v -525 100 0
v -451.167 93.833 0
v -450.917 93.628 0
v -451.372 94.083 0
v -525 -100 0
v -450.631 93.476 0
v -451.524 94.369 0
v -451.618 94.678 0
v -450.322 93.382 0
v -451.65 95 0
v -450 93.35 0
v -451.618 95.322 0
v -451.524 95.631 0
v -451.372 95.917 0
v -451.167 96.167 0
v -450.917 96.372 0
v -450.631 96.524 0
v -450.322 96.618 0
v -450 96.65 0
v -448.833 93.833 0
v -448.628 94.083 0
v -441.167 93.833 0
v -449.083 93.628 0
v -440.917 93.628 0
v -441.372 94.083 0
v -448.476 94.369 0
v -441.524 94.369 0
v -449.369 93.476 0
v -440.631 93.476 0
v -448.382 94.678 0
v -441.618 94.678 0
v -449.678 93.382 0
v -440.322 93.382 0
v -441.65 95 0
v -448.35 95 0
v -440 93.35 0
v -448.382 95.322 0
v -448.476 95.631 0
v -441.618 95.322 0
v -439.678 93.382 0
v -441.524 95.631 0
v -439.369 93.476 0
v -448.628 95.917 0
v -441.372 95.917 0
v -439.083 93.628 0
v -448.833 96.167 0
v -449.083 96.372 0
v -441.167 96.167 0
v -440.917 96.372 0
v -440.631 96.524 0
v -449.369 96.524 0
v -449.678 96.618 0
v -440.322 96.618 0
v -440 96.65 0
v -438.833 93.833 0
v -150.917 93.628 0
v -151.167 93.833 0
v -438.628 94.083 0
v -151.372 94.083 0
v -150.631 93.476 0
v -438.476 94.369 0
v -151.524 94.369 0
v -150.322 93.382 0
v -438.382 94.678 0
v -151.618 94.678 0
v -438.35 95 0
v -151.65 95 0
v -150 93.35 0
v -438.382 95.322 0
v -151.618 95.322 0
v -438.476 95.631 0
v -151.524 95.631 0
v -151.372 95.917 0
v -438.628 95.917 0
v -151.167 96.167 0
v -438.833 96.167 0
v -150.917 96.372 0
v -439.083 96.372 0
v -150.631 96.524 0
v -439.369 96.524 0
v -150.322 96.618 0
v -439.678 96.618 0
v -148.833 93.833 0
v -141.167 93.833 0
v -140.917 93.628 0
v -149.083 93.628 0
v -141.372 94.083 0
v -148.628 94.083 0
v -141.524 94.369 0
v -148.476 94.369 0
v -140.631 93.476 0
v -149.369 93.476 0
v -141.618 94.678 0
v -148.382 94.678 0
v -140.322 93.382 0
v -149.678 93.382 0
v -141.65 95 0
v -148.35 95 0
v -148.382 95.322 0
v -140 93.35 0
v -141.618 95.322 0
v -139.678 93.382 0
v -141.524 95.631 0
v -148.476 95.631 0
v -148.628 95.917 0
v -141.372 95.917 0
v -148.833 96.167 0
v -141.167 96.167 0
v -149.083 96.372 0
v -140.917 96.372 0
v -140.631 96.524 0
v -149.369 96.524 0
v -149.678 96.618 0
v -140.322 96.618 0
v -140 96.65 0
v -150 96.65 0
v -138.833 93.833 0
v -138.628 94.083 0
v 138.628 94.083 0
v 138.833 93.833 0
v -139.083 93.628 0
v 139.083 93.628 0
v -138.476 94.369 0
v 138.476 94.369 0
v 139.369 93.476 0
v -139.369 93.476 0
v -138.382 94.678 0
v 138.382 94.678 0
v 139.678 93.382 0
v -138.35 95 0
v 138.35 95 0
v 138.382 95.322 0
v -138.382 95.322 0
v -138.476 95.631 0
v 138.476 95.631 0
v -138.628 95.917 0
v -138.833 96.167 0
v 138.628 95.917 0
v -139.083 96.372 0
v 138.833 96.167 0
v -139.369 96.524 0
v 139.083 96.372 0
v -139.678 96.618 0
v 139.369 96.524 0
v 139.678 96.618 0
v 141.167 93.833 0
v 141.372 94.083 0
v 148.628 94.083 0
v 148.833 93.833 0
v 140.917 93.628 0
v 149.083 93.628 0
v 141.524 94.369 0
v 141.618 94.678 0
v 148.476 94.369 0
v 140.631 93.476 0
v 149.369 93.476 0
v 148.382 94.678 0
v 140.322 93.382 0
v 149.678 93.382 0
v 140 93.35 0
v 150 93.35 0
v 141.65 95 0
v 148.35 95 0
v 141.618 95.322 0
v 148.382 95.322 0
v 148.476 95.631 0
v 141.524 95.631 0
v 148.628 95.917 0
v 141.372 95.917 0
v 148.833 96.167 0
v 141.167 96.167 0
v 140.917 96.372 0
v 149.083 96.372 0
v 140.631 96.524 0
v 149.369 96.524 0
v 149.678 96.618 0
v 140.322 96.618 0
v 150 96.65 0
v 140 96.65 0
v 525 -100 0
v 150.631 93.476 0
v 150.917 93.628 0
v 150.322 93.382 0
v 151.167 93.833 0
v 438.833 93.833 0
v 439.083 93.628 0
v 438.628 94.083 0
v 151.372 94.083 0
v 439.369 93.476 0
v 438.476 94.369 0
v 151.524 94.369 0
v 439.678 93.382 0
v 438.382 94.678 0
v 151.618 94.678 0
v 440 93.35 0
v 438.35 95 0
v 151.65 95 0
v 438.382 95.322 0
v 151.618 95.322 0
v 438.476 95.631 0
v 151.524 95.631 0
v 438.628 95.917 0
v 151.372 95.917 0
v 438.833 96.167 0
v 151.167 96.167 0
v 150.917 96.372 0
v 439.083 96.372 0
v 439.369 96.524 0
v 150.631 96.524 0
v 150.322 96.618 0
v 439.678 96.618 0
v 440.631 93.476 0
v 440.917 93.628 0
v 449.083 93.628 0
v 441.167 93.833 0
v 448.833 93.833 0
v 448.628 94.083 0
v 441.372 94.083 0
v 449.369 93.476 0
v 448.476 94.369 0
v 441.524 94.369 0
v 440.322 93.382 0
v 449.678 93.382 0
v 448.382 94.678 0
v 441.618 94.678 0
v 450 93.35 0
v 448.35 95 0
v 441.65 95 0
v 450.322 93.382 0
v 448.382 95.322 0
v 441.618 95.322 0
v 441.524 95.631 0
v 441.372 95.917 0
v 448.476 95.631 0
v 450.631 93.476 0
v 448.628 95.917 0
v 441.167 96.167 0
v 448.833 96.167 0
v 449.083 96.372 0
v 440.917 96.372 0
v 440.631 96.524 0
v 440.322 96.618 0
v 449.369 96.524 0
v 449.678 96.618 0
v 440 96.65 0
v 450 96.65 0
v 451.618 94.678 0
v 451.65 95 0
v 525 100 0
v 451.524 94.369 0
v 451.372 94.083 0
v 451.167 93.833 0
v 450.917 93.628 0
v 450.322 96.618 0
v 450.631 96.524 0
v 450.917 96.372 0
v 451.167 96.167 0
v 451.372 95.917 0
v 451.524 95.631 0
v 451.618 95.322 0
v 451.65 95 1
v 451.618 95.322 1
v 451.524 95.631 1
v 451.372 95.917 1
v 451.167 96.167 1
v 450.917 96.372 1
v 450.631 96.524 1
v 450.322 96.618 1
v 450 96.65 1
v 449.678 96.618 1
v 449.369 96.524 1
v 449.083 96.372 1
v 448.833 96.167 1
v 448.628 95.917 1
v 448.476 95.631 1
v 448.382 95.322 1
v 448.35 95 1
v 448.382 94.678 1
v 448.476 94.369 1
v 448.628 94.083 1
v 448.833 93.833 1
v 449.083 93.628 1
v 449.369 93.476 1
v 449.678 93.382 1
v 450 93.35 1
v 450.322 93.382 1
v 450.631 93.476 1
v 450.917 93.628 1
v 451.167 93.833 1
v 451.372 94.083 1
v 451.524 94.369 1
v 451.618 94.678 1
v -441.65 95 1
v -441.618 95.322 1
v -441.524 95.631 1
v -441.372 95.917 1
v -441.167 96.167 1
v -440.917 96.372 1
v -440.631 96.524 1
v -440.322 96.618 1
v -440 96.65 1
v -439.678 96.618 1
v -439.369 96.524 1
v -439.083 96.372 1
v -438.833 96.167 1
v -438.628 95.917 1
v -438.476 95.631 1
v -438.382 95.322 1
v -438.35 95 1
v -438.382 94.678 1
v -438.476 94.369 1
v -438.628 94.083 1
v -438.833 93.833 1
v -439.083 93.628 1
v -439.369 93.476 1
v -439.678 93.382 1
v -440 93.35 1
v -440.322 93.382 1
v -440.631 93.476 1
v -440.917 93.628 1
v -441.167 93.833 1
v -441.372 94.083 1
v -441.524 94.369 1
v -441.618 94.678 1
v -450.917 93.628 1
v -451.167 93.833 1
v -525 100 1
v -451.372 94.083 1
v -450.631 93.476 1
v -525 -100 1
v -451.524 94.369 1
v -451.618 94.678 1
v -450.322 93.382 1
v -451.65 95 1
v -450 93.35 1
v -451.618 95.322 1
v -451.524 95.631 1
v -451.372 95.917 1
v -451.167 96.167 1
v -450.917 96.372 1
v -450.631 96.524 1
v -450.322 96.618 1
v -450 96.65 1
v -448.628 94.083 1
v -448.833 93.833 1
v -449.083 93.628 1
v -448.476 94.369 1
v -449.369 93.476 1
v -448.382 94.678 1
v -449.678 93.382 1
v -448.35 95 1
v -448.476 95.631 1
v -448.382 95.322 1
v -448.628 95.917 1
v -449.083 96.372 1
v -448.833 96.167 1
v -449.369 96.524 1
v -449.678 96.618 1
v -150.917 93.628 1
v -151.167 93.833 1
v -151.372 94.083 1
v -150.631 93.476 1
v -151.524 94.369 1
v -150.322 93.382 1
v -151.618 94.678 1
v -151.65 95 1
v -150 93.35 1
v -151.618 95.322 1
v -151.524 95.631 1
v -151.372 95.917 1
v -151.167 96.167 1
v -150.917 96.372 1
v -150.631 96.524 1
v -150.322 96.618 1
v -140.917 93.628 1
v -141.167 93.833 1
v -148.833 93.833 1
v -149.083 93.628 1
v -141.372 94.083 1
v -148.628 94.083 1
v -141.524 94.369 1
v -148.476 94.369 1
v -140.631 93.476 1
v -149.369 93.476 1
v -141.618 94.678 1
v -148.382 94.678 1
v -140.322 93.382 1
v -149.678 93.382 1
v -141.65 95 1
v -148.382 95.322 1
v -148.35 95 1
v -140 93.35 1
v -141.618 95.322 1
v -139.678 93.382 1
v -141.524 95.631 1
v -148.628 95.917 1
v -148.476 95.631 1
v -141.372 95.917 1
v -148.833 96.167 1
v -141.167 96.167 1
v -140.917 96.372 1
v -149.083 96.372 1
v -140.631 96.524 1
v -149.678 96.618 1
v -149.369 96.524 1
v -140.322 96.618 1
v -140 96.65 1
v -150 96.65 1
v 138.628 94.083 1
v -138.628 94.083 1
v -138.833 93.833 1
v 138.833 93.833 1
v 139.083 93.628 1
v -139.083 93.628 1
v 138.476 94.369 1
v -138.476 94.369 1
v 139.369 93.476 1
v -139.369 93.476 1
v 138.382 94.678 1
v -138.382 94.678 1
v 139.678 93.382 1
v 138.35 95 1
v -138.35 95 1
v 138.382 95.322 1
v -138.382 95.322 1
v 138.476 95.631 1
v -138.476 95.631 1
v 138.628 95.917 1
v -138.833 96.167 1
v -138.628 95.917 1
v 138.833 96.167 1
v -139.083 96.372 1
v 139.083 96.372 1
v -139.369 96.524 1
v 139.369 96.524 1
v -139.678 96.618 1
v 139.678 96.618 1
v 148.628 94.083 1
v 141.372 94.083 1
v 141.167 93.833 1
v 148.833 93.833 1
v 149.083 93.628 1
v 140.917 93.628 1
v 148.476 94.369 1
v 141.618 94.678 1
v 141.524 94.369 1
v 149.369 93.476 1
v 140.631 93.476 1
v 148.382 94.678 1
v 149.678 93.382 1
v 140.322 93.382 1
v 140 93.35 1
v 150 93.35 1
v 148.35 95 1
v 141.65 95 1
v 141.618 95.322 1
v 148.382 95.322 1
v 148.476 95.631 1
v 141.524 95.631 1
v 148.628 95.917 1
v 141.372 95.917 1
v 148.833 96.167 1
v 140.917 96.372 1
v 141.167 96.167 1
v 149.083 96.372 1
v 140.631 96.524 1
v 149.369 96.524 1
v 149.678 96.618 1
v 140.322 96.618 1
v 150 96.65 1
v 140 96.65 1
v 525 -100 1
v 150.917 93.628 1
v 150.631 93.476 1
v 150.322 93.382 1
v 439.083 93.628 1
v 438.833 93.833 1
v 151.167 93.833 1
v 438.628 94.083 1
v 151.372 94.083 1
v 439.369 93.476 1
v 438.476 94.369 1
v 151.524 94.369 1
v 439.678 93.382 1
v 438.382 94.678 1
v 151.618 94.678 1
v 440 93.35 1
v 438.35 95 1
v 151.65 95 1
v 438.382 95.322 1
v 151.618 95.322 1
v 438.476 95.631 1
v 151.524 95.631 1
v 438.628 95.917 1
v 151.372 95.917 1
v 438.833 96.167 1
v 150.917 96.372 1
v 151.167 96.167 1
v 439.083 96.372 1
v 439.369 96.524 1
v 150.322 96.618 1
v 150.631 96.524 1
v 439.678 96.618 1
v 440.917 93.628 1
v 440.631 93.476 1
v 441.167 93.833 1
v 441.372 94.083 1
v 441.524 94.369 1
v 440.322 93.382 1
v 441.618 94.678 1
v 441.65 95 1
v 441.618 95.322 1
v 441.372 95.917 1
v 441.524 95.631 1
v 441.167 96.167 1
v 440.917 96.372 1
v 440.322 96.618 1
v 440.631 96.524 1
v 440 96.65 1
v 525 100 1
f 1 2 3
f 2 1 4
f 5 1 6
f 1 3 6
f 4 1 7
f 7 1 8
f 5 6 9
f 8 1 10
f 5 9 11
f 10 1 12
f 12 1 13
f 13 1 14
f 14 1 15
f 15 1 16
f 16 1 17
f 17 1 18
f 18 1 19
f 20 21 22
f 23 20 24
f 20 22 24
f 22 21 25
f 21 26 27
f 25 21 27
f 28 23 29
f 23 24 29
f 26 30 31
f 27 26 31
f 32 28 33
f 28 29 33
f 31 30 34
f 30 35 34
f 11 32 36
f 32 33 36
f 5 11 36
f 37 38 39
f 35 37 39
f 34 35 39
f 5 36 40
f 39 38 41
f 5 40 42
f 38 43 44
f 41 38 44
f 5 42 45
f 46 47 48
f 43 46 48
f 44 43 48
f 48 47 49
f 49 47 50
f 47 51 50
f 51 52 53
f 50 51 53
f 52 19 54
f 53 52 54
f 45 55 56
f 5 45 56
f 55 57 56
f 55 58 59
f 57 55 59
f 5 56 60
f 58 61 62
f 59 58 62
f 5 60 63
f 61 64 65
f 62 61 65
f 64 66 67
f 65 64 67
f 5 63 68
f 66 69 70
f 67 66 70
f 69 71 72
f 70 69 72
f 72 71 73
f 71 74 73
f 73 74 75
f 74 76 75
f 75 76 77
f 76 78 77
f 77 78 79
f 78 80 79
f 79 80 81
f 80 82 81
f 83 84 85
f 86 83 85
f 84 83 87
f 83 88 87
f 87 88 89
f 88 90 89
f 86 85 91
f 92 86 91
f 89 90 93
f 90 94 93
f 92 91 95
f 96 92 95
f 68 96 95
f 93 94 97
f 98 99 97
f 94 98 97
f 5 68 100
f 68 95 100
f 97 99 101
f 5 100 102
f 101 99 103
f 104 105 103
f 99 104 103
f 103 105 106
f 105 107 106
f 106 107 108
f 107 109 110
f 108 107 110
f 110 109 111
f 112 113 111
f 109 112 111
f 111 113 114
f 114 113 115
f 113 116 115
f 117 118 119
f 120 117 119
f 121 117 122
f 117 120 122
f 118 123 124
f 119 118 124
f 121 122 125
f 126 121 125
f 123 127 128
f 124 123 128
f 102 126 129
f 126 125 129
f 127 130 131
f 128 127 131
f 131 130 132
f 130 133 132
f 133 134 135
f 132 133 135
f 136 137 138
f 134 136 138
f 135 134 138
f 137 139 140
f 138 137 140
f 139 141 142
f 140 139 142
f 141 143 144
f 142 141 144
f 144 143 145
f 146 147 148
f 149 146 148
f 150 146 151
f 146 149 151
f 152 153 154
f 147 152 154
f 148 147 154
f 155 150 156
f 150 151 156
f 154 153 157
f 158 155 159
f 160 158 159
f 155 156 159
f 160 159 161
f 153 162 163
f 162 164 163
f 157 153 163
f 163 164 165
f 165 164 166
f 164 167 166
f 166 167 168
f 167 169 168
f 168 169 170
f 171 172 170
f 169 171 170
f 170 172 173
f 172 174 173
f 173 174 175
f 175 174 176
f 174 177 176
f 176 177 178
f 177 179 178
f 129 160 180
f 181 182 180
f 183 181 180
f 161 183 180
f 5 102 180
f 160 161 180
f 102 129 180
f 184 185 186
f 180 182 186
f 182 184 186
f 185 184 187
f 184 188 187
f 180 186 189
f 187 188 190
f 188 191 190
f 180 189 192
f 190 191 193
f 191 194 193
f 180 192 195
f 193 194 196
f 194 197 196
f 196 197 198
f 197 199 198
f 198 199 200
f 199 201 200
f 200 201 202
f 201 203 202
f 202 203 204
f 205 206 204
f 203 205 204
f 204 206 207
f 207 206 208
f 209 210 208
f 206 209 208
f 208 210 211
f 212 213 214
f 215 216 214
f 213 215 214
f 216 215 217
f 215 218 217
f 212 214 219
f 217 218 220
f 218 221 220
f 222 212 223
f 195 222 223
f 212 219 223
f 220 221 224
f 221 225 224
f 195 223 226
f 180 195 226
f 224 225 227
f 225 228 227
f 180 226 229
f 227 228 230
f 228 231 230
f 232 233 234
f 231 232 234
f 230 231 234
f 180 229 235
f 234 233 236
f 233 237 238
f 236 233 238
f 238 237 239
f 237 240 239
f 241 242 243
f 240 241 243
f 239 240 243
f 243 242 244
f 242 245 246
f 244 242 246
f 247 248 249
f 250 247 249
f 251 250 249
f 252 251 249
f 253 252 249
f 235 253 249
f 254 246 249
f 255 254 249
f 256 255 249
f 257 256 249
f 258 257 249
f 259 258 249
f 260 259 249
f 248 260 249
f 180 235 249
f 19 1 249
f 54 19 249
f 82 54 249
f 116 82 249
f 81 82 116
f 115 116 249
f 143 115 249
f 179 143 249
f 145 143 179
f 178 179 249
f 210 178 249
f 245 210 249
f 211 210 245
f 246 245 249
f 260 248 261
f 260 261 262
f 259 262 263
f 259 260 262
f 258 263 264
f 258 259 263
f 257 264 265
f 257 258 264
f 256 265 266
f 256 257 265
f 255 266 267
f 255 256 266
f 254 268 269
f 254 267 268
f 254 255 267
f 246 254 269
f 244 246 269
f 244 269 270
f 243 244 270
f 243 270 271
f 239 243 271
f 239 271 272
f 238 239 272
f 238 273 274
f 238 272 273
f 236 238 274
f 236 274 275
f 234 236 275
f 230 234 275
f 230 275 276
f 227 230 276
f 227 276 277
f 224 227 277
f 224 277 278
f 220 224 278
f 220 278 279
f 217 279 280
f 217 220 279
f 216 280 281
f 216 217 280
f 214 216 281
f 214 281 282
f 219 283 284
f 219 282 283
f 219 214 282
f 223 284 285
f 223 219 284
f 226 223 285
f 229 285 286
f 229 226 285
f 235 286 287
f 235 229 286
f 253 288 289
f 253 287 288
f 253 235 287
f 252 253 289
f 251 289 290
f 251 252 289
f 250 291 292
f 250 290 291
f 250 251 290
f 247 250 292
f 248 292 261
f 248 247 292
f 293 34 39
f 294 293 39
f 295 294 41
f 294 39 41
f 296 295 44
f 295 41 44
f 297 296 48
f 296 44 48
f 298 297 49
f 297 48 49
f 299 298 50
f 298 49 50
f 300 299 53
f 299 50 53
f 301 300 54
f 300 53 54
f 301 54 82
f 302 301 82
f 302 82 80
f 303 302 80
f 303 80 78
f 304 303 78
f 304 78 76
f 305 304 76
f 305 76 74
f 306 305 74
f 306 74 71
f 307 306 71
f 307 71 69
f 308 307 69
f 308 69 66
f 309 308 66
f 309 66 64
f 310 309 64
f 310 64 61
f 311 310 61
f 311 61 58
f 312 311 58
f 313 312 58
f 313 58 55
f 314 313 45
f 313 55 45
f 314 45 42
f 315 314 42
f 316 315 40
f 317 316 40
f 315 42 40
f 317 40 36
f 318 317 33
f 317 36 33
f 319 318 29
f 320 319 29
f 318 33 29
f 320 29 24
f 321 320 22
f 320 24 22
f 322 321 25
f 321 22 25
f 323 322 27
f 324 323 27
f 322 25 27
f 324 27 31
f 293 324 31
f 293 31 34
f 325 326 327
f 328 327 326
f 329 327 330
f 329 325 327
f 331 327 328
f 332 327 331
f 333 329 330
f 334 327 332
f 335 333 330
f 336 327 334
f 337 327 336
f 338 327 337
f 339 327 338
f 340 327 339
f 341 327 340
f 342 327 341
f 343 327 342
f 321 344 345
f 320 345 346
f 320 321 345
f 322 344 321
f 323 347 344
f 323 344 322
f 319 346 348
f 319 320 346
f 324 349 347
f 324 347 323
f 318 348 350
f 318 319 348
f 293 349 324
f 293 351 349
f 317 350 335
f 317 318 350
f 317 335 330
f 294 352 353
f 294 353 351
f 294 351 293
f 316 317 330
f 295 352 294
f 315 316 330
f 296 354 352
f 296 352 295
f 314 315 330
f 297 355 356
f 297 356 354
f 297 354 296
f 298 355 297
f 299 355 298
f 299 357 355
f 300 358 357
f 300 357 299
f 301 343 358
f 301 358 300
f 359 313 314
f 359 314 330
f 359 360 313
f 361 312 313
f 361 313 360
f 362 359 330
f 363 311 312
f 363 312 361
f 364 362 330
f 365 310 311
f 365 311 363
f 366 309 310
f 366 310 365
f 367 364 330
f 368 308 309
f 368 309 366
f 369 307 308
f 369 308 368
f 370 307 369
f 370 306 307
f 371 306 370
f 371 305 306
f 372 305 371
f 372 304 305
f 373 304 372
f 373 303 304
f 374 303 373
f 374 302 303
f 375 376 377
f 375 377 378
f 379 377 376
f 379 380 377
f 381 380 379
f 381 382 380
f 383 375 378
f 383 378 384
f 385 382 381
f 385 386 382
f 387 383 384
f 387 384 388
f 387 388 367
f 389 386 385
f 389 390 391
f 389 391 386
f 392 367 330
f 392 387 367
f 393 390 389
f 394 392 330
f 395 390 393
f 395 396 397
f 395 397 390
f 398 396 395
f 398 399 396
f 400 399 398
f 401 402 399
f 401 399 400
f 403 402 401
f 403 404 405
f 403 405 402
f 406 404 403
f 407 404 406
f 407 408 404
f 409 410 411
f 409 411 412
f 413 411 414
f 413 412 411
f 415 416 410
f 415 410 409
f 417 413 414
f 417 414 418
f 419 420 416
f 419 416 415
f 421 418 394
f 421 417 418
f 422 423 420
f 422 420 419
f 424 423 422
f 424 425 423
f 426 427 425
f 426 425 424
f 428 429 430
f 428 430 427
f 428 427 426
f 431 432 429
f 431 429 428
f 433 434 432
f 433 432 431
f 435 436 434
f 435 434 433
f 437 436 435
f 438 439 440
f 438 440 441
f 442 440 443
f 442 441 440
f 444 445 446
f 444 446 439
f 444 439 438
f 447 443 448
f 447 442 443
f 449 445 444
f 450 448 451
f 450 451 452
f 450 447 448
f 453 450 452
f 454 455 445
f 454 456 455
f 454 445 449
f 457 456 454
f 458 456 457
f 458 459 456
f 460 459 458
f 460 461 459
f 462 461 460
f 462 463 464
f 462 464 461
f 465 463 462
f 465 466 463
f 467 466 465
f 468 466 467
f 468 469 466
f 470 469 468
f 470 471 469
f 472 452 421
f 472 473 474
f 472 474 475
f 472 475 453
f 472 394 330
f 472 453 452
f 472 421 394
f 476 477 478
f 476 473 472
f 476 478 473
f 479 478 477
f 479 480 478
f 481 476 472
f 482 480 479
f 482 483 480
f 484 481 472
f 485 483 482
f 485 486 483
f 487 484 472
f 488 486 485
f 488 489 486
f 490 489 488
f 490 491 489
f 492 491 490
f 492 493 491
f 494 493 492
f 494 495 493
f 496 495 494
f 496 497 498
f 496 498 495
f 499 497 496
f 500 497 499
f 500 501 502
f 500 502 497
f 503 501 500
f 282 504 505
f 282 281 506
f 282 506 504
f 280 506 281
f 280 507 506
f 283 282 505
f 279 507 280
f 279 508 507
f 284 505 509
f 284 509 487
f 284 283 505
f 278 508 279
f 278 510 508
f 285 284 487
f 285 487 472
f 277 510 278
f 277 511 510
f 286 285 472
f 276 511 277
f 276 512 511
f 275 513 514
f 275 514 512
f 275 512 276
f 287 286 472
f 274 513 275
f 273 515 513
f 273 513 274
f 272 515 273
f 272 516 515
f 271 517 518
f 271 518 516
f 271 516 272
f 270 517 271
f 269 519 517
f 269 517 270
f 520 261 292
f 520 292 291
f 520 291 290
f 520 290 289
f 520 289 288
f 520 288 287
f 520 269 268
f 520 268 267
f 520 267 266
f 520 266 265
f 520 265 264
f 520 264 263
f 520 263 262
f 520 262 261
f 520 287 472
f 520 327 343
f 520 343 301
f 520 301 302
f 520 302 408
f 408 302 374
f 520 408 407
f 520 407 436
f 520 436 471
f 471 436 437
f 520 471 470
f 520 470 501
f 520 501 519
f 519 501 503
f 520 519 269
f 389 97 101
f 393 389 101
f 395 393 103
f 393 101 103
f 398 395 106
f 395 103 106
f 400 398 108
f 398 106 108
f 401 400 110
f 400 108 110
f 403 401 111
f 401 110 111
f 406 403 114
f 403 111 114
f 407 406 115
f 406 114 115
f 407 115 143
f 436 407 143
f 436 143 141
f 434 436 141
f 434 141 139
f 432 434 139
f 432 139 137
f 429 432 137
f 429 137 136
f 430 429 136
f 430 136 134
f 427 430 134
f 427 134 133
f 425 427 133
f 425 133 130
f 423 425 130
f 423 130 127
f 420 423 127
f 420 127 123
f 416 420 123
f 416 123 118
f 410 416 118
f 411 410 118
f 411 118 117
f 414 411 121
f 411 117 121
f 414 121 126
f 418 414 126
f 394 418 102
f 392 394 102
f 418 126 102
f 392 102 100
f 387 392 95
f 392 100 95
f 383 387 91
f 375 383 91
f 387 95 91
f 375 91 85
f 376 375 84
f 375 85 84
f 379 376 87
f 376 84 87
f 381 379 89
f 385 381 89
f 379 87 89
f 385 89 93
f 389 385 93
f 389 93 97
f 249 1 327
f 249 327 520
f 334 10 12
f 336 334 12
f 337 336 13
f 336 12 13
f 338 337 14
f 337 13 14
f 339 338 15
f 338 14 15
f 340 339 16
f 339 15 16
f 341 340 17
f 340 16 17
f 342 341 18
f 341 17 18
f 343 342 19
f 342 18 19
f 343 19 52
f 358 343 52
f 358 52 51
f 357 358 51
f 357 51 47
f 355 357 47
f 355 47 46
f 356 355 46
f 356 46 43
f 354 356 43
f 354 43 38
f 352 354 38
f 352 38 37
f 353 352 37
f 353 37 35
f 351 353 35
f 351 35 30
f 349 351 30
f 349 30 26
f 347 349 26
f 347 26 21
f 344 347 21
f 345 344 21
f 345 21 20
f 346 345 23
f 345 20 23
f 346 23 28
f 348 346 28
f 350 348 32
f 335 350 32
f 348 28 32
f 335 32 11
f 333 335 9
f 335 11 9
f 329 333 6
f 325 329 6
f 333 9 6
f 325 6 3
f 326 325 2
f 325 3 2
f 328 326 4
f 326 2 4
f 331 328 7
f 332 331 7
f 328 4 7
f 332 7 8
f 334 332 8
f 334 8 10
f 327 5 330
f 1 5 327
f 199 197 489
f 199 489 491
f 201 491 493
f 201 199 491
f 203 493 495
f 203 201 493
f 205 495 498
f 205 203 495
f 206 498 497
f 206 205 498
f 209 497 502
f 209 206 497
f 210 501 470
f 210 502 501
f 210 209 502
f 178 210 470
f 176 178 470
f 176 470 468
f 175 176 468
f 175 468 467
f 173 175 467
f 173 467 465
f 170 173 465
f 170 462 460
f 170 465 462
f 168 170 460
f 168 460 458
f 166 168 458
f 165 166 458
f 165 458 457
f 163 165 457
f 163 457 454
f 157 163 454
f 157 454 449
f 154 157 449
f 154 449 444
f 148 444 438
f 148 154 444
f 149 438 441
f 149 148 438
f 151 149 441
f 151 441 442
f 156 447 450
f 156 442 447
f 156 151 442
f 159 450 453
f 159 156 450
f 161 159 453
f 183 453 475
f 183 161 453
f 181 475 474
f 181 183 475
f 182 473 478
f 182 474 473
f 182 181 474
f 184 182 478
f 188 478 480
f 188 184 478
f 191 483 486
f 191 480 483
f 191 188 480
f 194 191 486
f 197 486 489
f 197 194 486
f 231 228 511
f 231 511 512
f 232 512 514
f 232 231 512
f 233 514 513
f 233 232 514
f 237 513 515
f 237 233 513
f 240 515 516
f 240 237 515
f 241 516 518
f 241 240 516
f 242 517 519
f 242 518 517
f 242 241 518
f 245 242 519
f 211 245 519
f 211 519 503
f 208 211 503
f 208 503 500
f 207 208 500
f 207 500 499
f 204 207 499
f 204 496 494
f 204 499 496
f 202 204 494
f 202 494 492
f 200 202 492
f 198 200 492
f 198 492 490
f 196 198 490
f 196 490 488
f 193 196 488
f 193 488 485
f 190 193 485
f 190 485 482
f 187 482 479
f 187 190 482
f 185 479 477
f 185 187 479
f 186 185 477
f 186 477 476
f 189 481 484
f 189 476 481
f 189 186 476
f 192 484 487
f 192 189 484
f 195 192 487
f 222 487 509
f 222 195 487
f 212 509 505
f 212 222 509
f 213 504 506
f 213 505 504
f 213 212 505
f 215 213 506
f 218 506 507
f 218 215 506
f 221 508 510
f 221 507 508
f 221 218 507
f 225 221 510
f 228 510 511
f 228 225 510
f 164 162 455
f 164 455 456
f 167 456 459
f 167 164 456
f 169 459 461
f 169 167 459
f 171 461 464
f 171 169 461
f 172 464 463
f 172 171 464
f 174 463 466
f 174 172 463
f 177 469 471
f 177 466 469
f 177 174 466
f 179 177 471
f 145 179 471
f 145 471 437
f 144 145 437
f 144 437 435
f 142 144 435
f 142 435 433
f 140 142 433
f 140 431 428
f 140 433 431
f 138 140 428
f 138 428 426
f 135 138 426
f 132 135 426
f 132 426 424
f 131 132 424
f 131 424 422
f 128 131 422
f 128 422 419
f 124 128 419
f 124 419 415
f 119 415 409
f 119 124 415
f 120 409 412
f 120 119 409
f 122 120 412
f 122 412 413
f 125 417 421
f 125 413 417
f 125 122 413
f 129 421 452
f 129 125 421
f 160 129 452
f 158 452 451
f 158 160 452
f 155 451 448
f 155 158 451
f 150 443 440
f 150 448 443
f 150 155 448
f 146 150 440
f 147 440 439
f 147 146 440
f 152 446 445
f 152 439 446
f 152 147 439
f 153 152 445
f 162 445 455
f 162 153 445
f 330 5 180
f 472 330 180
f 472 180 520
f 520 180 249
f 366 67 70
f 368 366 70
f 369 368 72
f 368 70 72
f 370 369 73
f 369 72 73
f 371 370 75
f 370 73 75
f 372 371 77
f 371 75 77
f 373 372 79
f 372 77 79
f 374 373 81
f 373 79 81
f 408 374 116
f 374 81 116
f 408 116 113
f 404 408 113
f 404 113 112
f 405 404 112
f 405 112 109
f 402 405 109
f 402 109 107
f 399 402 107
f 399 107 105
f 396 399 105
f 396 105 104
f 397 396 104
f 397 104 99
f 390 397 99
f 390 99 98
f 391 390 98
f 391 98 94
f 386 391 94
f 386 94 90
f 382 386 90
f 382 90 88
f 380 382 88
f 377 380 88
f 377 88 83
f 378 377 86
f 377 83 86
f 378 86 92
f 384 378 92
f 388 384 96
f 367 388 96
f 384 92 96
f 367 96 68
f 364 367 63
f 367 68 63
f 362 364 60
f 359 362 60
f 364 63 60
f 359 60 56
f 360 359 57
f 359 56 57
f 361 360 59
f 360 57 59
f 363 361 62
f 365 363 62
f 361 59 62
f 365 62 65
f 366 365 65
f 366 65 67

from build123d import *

# Parameters (mm, degrees)
SKETCH1_W             = 1050
SKETCH1_H             = 200
BOSS_EXTRUDE1_DEPTH   = 1
M4X0_7_TAPPED_HOLE1_D = 3.3


with BuildPart() as part:
    # Sketch1 → Boss-Extrude1 (new body)
    with BuildSketch(Plane.XY):
        Rectangle(SKETCH1_W, SKETCH1_H)
    extrude(amount=BOSS_EXTRUDE1_DEPTH)

    # M4x0.7 Tapped Hole1 (through all)
    with Locations(Plane.XY.offset(1)):
        with Locations((-450, 95), (-440, 95), (-150, 95), (-140, 95)):
            m4x0_7_tapped_hole1 = Hole(M4X0_7_TAPPED_HOLE1_D / 2)

    # Mirror1: M4x0.7 Tapped Hole1 across plane
    add(m4x0_7_tapped_hole1.mirror(Plane(origin=(0, 0, 0), x_dir=(0, 0, 1), z_dir=(1, 0, 0))), mode=Mode.SUBTRACT)


solid = part.part
